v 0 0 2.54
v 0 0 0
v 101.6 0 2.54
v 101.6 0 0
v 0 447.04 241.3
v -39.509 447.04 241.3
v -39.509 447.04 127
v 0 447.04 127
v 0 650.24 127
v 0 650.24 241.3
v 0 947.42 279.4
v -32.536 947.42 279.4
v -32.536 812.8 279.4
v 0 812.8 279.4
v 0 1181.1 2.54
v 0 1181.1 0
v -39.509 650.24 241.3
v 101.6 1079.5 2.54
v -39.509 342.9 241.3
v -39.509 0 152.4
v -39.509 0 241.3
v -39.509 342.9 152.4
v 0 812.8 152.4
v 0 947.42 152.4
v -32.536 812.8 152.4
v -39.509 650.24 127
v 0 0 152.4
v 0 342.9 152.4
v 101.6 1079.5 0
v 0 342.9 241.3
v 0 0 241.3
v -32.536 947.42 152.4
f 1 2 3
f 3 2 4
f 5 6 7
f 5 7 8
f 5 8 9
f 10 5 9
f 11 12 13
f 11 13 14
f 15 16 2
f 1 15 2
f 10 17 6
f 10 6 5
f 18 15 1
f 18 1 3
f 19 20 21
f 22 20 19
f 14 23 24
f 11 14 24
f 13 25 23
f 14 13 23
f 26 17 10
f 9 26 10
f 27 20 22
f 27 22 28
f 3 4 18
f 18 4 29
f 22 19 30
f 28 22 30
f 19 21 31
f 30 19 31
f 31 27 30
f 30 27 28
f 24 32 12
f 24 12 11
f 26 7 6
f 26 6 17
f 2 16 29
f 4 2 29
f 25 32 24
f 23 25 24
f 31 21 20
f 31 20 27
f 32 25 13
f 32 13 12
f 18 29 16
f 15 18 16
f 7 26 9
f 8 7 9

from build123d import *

# Parameters (mm, degrees)
F1_DEPTH = 2.54
F3_START = 152.4
F2_W     = 39.5086954395
F2_H     = 342.9
F3_DEPTH = 88.9
F4_START = 127
F2_H_2   = 203.2
F4_DEPTH = 114.3
F5_START = 152.4
F2_W_2   = 32.536033541
F2_H_3   = 134.62
F5_DEPTH = 127


with BuildPart() as f1:
    # F0 (on Top) → F1 (new body)
    with BuildSketch(Plane.XY):
        Polygon((101.6, 1079.5), (0, 1181.1), (0, 0), (101.6, 0), align=None)
    extrude(amount=F1_DEPTH)


with BuildPart() as f3:
    # F2 (on Top) → F3 (new body)
    with BuildSketch(Plane.XY.offset(F3_START)):
        with Locations((-19.7543477197, 171.45)):
            Rectangle(F2_W, F2_H)
    extrude(amount=F3_DEPTH)


with BuildPart() as f4:
    # F2 (on Top) → F4 (new body)
    with BuildSketch(Plane.XY.offset(F4_START)):
        with Locations((-19.7543477197, 548.64)):
            Rectangle(F2_W, F2_H_2)
    extrude(amount=F4_DEPTH)


with BuildPart() as f5:
    # F2 (on Top) → F5 (new body)
    with BuildSketch(Plane.XY.offset(F5_START)):
        with Locations((-16.2680167705, 880.11)):
            Rectangle(F2_W_2, F2_H_3)
    extrude(amount=F5_DEPTH)


solid = Compound([f1.part, f3.part, f4.part, f5.part])
